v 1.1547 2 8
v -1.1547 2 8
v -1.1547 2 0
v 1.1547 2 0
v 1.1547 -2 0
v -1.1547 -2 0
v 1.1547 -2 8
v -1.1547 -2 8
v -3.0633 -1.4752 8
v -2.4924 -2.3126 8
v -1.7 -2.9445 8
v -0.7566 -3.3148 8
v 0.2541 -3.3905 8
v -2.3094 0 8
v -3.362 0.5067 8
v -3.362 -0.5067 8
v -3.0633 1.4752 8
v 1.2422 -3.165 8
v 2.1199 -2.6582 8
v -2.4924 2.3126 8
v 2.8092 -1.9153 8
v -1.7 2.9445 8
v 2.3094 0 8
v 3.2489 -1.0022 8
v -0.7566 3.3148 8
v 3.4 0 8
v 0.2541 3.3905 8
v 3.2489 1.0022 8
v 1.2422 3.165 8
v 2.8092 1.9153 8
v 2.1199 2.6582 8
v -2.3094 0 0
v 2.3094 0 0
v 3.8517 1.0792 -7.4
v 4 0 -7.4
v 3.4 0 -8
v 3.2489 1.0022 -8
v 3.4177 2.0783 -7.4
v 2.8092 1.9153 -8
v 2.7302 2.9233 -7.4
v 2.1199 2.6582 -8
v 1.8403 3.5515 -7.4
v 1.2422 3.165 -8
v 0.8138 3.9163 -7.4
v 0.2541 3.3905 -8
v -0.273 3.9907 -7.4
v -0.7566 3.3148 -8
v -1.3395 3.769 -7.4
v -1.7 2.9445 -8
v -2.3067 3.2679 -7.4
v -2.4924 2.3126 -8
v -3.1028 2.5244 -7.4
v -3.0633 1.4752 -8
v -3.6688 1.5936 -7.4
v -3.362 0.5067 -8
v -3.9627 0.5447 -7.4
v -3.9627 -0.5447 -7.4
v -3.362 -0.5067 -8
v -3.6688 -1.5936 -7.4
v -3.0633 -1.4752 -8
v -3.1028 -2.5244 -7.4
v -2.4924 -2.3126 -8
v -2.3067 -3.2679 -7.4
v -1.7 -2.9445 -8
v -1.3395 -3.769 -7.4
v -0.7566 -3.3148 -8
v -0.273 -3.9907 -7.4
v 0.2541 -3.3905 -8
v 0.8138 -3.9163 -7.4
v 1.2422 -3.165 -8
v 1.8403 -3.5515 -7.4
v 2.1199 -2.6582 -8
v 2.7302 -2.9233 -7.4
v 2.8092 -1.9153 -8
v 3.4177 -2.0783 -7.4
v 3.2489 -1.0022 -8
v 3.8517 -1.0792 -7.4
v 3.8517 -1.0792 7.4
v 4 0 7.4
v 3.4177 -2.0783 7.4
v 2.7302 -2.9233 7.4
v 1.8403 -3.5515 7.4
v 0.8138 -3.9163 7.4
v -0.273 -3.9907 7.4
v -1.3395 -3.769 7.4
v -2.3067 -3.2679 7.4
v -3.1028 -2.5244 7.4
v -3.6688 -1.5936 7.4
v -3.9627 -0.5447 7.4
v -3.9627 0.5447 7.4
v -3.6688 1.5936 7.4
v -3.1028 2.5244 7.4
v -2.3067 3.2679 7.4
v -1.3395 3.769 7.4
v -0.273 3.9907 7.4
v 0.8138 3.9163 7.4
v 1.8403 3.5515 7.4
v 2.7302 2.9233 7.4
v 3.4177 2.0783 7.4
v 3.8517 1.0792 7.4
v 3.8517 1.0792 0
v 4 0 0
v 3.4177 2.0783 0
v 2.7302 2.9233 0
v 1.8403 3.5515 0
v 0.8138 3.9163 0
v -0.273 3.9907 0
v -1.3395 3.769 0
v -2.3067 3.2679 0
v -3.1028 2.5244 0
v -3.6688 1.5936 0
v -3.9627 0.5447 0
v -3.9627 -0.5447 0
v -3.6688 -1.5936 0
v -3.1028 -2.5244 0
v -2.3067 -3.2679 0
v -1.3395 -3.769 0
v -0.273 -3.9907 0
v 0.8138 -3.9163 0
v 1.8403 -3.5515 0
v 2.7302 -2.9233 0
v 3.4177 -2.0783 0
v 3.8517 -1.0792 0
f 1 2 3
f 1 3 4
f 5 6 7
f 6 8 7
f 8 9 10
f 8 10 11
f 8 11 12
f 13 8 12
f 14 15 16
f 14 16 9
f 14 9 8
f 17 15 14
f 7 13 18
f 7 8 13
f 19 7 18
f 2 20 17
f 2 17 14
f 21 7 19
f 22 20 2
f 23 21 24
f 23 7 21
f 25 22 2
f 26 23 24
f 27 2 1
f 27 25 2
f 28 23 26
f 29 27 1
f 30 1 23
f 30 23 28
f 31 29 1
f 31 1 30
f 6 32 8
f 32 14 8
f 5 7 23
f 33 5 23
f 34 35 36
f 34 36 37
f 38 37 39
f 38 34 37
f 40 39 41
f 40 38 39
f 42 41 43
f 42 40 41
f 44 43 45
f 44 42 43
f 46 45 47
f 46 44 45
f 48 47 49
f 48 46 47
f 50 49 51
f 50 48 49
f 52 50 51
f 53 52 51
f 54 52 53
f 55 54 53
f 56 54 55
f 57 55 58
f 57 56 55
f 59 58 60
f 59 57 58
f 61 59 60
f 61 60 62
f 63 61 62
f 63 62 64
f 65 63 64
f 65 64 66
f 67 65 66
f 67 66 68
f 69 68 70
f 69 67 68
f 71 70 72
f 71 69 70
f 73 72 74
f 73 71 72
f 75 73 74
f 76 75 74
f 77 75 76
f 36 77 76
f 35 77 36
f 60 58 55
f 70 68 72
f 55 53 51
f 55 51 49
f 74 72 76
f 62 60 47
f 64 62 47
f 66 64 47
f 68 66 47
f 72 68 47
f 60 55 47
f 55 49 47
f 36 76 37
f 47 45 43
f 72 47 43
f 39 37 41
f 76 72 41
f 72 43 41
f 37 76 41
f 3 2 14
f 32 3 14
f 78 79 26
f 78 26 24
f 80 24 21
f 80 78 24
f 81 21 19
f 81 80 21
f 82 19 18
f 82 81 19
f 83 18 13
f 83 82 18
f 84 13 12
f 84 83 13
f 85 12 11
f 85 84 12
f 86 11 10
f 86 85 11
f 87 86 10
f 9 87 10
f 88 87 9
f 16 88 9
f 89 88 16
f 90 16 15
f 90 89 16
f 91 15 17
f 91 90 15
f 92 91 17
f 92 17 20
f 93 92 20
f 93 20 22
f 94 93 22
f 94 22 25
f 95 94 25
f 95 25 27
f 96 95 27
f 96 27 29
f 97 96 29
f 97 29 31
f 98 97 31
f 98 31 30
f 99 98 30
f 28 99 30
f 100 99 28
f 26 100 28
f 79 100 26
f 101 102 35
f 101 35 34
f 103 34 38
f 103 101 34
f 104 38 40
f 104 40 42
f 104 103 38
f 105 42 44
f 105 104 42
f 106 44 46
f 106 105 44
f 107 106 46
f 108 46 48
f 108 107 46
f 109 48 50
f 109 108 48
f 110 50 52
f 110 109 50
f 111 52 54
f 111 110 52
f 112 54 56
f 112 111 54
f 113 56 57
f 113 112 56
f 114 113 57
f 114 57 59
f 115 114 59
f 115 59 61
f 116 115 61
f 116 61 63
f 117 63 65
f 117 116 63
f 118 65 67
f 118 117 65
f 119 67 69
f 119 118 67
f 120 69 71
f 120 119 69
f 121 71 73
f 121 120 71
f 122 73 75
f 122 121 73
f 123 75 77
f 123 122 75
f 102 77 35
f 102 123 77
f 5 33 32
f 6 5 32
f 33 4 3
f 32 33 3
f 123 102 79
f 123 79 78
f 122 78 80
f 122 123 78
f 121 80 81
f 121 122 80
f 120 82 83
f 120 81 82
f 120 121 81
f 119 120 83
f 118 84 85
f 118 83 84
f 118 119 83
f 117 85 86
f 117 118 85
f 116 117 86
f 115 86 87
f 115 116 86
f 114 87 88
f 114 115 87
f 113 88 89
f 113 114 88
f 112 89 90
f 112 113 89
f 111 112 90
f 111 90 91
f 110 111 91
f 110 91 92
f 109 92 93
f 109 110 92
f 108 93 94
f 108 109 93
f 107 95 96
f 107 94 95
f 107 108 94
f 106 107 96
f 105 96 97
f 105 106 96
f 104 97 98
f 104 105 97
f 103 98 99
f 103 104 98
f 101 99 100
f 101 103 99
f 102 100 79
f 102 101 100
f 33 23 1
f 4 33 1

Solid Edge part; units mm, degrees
sketch "Sketch1" plane through (0, 0, 0) normal (0, 0, 1) x (1, 0, 0)
  circle A0 centre (0, 0) radius 4
  dimension "D1" = 8
extrude "Protrusion1" add sketch "Sketch1" along normal mid plane 16
chamfer "Chamfer1" distance 0.6 angle 45 2 edges at (-4, 0, -8) (-4, 0, 8)
sketch "Sketch2" plane through (0, 0, 8) normal (0, 0, 1) x (1, 0, 0)
  line L0 (-1.1547, 2) -> (1.1547, 2)
  line L1 (2.3094, 0) -> (1.1547, 2)
  line L2 (1.1547, -2) -> (2.3094, 0)
  line L3 (-1.1547, -2) -> (1.1547, -2)
  line L4 (-2.3094, 0) -> (-1.1547, -2)
  line L5 (-1.1547, 2) -> (-2.3094, 0)
  dimension "D1" = 4
extrude "Cutout1" cut sketch "Sketch2" against normal blind 8
properties part number "24104727"
